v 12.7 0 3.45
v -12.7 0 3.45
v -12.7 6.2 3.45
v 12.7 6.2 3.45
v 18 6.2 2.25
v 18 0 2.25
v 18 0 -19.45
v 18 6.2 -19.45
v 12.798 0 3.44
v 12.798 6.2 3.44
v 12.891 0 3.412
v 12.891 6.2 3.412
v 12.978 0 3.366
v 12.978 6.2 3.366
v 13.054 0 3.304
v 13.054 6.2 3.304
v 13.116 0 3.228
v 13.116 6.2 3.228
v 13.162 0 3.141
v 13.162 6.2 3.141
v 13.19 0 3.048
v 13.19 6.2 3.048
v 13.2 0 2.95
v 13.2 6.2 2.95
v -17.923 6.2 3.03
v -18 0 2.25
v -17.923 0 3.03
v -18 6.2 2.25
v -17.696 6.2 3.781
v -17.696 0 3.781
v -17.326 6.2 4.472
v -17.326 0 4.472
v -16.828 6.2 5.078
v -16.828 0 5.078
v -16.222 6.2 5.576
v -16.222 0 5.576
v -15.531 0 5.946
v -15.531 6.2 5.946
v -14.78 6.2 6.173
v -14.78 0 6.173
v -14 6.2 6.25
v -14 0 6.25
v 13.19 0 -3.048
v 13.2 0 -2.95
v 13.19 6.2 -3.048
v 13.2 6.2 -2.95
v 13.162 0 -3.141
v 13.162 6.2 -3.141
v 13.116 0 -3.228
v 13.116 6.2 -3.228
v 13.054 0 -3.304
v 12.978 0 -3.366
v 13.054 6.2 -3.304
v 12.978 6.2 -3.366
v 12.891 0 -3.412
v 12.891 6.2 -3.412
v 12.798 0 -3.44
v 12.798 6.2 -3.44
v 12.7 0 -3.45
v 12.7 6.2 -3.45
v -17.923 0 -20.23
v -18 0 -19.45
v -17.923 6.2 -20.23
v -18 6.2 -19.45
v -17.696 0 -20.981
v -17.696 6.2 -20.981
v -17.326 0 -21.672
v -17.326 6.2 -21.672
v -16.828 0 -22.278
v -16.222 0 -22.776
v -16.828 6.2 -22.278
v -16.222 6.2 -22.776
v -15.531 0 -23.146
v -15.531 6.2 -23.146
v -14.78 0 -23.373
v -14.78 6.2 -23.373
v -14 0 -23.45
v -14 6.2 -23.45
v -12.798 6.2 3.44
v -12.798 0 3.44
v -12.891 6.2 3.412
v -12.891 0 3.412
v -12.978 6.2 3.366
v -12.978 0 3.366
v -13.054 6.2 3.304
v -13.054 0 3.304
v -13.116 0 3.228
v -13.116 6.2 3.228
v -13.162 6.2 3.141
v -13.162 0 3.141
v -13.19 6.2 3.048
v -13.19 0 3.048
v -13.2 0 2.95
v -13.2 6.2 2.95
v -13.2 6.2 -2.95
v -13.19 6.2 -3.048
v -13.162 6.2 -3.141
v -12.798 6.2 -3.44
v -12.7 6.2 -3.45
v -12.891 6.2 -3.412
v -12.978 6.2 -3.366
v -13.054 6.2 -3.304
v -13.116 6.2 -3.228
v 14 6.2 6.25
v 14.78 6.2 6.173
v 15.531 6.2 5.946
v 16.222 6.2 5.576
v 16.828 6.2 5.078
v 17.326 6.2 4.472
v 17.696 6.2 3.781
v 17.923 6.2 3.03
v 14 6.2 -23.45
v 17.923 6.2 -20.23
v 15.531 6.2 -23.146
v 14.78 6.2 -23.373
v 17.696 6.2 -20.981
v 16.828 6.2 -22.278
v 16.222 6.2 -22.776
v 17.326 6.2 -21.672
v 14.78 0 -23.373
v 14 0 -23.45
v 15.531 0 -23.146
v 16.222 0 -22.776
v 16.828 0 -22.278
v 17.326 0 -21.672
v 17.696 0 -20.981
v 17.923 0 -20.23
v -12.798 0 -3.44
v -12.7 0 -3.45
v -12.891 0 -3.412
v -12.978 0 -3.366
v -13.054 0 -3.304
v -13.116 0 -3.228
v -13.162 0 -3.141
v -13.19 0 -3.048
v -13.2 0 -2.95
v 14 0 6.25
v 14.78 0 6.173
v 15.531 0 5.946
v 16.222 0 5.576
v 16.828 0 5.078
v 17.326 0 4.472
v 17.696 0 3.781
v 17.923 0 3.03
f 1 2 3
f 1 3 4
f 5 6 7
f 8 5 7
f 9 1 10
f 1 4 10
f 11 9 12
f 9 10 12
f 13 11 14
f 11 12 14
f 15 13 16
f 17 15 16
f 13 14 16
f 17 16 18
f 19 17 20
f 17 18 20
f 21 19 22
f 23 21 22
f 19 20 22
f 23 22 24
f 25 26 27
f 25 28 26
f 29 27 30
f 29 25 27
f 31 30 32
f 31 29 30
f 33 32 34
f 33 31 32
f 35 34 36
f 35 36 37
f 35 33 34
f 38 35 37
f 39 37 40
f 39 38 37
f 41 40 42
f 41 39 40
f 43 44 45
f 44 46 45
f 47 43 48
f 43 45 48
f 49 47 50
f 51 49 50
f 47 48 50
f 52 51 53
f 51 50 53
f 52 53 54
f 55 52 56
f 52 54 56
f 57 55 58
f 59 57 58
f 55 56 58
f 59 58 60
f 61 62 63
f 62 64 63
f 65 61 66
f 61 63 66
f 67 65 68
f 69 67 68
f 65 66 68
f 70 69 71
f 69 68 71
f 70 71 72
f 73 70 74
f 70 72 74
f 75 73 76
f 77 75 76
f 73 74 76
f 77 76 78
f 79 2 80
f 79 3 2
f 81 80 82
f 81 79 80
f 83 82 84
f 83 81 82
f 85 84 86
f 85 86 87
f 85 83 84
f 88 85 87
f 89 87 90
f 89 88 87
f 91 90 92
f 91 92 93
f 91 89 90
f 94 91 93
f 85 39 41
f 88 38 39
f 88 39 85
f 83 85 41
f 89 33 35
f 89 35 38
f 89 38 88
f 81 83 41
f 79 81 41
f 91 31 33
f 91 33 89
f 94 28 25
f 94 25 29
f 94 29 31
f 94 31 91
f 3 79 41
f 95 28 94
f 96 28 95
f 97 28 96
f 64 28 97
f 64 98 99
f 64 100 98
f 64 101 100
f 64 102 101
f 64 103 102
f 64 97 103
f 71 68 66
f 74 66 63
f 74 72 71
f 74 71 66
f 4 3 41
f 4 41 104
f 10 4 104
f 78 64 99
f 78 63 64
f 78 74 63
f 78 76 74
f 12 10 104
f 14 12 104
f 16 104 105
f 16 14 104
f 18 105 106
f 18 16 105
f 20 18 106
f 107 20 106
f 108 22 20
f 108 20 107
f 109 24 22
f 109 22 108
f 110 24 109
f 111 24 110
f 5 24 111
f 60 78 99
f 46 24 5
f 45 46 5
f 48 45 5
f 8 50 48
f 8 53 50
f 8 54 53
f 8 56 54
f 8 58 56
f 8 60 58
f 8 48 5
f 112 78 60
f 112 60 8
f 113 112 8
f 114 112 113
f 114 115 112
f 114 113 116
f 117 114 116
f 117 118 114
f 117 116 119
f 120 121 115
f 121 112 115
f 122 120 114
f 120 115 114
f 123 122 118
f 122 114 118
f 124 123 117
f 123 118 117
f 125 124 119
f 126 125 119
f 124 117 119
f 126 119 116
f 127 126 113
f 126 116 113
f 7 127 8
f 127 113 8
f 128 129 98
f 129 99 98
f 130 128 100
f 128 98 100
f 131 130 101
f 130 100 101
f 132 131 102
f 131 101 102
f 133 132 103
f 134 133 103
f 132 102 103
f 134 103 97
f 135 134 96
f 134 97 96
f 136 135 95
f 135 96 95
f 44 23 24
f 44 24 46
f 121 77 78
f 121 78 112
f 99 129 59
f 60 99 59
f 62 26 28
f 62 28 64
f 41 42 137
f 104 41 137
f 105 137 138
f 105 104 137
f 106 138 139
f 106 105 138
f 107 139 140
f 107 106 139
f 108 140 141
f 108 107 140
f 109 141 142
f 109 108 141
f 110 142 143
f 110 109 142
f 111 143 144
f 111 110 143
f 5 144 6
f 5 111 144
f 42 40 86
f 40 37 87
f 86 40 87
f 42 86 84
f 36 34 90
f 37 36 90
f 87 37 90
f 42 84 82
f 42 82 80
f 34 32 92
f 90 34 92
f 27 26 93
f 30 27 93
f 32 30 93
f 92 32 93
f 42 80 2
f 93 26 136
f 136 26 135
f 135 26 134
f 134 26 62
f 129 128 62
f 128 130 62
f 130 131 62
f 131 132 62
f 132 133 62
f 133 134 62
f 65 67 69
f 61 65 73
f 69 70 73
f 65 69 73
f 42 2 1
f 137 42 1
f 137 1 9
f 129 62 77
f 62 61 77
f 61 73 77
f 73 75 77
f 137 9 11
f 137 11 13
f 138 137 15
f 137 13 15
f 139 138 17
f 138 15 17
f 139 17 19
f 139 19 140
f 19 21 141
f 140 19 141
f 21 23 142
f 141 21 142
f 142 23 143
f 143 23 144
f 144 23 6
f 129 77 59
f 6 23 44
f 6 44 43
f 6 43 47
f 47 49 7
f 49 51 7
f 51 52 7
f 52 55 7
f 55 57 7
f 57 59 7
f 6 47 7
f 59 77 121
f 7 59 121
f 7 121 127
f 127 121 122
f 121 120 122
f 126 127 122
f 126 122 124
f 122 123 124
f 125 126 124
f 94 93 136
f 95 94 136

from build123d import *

# Parameters (mm, degrees)
SKETCH1_W           = 36
SKETCH1_H           = 29.7
SKETCH1_W_2         = 26.4
SKETCH1_H_2         = 6.9
BOSS_EXTRUDE1_DEPTH = 6.2
FILLET1_R           = 4
FILLET2_R           = 0.5


with BuildPart() as part:
    # Sketch1 → Boss-Extrude1 (new body)
    with BuildSketch(Plane(origin=(0, 0, 0), x_dir=(1, 0, 0), z_dir=(0, 1, 0))):
        with Locations((0, 8.6)):
            Rectangle(SKETCH1_W, SKETCH1_H)
        Rectangle(SKETCH1_W_2, SKETCH1_H_2, mode=Mode.SUBTRACT)
    extrude(amount=BOSS_EXTRUDE1_DEPTH)

    # Fillet1
    fillet1_edges = [part.edges().sort_by_distance(p)[0] for p in [
        (-18, 3.1, -23.45),
        (18, 3.1, -23.45),
        (18, 3.1, 6.25),
        (-18, 3.1, 6.25),
    ]]
    fillet(fillet1_edges, radius=FILLET1_R)

    # Fillet2
    fillet2_edges = [part.edges().sort_by_distance(p)[0] for p in [
        (13.2, 3.1, 3.45),
        (13.2, 3.1, -3.45),
        (-13.2, 3.1, -3.45),
        (-13.2, 3.1, 3.45),
    ]]
    fillet(fillet2_edges, radius=FILLET2_R)


solid = part.part
